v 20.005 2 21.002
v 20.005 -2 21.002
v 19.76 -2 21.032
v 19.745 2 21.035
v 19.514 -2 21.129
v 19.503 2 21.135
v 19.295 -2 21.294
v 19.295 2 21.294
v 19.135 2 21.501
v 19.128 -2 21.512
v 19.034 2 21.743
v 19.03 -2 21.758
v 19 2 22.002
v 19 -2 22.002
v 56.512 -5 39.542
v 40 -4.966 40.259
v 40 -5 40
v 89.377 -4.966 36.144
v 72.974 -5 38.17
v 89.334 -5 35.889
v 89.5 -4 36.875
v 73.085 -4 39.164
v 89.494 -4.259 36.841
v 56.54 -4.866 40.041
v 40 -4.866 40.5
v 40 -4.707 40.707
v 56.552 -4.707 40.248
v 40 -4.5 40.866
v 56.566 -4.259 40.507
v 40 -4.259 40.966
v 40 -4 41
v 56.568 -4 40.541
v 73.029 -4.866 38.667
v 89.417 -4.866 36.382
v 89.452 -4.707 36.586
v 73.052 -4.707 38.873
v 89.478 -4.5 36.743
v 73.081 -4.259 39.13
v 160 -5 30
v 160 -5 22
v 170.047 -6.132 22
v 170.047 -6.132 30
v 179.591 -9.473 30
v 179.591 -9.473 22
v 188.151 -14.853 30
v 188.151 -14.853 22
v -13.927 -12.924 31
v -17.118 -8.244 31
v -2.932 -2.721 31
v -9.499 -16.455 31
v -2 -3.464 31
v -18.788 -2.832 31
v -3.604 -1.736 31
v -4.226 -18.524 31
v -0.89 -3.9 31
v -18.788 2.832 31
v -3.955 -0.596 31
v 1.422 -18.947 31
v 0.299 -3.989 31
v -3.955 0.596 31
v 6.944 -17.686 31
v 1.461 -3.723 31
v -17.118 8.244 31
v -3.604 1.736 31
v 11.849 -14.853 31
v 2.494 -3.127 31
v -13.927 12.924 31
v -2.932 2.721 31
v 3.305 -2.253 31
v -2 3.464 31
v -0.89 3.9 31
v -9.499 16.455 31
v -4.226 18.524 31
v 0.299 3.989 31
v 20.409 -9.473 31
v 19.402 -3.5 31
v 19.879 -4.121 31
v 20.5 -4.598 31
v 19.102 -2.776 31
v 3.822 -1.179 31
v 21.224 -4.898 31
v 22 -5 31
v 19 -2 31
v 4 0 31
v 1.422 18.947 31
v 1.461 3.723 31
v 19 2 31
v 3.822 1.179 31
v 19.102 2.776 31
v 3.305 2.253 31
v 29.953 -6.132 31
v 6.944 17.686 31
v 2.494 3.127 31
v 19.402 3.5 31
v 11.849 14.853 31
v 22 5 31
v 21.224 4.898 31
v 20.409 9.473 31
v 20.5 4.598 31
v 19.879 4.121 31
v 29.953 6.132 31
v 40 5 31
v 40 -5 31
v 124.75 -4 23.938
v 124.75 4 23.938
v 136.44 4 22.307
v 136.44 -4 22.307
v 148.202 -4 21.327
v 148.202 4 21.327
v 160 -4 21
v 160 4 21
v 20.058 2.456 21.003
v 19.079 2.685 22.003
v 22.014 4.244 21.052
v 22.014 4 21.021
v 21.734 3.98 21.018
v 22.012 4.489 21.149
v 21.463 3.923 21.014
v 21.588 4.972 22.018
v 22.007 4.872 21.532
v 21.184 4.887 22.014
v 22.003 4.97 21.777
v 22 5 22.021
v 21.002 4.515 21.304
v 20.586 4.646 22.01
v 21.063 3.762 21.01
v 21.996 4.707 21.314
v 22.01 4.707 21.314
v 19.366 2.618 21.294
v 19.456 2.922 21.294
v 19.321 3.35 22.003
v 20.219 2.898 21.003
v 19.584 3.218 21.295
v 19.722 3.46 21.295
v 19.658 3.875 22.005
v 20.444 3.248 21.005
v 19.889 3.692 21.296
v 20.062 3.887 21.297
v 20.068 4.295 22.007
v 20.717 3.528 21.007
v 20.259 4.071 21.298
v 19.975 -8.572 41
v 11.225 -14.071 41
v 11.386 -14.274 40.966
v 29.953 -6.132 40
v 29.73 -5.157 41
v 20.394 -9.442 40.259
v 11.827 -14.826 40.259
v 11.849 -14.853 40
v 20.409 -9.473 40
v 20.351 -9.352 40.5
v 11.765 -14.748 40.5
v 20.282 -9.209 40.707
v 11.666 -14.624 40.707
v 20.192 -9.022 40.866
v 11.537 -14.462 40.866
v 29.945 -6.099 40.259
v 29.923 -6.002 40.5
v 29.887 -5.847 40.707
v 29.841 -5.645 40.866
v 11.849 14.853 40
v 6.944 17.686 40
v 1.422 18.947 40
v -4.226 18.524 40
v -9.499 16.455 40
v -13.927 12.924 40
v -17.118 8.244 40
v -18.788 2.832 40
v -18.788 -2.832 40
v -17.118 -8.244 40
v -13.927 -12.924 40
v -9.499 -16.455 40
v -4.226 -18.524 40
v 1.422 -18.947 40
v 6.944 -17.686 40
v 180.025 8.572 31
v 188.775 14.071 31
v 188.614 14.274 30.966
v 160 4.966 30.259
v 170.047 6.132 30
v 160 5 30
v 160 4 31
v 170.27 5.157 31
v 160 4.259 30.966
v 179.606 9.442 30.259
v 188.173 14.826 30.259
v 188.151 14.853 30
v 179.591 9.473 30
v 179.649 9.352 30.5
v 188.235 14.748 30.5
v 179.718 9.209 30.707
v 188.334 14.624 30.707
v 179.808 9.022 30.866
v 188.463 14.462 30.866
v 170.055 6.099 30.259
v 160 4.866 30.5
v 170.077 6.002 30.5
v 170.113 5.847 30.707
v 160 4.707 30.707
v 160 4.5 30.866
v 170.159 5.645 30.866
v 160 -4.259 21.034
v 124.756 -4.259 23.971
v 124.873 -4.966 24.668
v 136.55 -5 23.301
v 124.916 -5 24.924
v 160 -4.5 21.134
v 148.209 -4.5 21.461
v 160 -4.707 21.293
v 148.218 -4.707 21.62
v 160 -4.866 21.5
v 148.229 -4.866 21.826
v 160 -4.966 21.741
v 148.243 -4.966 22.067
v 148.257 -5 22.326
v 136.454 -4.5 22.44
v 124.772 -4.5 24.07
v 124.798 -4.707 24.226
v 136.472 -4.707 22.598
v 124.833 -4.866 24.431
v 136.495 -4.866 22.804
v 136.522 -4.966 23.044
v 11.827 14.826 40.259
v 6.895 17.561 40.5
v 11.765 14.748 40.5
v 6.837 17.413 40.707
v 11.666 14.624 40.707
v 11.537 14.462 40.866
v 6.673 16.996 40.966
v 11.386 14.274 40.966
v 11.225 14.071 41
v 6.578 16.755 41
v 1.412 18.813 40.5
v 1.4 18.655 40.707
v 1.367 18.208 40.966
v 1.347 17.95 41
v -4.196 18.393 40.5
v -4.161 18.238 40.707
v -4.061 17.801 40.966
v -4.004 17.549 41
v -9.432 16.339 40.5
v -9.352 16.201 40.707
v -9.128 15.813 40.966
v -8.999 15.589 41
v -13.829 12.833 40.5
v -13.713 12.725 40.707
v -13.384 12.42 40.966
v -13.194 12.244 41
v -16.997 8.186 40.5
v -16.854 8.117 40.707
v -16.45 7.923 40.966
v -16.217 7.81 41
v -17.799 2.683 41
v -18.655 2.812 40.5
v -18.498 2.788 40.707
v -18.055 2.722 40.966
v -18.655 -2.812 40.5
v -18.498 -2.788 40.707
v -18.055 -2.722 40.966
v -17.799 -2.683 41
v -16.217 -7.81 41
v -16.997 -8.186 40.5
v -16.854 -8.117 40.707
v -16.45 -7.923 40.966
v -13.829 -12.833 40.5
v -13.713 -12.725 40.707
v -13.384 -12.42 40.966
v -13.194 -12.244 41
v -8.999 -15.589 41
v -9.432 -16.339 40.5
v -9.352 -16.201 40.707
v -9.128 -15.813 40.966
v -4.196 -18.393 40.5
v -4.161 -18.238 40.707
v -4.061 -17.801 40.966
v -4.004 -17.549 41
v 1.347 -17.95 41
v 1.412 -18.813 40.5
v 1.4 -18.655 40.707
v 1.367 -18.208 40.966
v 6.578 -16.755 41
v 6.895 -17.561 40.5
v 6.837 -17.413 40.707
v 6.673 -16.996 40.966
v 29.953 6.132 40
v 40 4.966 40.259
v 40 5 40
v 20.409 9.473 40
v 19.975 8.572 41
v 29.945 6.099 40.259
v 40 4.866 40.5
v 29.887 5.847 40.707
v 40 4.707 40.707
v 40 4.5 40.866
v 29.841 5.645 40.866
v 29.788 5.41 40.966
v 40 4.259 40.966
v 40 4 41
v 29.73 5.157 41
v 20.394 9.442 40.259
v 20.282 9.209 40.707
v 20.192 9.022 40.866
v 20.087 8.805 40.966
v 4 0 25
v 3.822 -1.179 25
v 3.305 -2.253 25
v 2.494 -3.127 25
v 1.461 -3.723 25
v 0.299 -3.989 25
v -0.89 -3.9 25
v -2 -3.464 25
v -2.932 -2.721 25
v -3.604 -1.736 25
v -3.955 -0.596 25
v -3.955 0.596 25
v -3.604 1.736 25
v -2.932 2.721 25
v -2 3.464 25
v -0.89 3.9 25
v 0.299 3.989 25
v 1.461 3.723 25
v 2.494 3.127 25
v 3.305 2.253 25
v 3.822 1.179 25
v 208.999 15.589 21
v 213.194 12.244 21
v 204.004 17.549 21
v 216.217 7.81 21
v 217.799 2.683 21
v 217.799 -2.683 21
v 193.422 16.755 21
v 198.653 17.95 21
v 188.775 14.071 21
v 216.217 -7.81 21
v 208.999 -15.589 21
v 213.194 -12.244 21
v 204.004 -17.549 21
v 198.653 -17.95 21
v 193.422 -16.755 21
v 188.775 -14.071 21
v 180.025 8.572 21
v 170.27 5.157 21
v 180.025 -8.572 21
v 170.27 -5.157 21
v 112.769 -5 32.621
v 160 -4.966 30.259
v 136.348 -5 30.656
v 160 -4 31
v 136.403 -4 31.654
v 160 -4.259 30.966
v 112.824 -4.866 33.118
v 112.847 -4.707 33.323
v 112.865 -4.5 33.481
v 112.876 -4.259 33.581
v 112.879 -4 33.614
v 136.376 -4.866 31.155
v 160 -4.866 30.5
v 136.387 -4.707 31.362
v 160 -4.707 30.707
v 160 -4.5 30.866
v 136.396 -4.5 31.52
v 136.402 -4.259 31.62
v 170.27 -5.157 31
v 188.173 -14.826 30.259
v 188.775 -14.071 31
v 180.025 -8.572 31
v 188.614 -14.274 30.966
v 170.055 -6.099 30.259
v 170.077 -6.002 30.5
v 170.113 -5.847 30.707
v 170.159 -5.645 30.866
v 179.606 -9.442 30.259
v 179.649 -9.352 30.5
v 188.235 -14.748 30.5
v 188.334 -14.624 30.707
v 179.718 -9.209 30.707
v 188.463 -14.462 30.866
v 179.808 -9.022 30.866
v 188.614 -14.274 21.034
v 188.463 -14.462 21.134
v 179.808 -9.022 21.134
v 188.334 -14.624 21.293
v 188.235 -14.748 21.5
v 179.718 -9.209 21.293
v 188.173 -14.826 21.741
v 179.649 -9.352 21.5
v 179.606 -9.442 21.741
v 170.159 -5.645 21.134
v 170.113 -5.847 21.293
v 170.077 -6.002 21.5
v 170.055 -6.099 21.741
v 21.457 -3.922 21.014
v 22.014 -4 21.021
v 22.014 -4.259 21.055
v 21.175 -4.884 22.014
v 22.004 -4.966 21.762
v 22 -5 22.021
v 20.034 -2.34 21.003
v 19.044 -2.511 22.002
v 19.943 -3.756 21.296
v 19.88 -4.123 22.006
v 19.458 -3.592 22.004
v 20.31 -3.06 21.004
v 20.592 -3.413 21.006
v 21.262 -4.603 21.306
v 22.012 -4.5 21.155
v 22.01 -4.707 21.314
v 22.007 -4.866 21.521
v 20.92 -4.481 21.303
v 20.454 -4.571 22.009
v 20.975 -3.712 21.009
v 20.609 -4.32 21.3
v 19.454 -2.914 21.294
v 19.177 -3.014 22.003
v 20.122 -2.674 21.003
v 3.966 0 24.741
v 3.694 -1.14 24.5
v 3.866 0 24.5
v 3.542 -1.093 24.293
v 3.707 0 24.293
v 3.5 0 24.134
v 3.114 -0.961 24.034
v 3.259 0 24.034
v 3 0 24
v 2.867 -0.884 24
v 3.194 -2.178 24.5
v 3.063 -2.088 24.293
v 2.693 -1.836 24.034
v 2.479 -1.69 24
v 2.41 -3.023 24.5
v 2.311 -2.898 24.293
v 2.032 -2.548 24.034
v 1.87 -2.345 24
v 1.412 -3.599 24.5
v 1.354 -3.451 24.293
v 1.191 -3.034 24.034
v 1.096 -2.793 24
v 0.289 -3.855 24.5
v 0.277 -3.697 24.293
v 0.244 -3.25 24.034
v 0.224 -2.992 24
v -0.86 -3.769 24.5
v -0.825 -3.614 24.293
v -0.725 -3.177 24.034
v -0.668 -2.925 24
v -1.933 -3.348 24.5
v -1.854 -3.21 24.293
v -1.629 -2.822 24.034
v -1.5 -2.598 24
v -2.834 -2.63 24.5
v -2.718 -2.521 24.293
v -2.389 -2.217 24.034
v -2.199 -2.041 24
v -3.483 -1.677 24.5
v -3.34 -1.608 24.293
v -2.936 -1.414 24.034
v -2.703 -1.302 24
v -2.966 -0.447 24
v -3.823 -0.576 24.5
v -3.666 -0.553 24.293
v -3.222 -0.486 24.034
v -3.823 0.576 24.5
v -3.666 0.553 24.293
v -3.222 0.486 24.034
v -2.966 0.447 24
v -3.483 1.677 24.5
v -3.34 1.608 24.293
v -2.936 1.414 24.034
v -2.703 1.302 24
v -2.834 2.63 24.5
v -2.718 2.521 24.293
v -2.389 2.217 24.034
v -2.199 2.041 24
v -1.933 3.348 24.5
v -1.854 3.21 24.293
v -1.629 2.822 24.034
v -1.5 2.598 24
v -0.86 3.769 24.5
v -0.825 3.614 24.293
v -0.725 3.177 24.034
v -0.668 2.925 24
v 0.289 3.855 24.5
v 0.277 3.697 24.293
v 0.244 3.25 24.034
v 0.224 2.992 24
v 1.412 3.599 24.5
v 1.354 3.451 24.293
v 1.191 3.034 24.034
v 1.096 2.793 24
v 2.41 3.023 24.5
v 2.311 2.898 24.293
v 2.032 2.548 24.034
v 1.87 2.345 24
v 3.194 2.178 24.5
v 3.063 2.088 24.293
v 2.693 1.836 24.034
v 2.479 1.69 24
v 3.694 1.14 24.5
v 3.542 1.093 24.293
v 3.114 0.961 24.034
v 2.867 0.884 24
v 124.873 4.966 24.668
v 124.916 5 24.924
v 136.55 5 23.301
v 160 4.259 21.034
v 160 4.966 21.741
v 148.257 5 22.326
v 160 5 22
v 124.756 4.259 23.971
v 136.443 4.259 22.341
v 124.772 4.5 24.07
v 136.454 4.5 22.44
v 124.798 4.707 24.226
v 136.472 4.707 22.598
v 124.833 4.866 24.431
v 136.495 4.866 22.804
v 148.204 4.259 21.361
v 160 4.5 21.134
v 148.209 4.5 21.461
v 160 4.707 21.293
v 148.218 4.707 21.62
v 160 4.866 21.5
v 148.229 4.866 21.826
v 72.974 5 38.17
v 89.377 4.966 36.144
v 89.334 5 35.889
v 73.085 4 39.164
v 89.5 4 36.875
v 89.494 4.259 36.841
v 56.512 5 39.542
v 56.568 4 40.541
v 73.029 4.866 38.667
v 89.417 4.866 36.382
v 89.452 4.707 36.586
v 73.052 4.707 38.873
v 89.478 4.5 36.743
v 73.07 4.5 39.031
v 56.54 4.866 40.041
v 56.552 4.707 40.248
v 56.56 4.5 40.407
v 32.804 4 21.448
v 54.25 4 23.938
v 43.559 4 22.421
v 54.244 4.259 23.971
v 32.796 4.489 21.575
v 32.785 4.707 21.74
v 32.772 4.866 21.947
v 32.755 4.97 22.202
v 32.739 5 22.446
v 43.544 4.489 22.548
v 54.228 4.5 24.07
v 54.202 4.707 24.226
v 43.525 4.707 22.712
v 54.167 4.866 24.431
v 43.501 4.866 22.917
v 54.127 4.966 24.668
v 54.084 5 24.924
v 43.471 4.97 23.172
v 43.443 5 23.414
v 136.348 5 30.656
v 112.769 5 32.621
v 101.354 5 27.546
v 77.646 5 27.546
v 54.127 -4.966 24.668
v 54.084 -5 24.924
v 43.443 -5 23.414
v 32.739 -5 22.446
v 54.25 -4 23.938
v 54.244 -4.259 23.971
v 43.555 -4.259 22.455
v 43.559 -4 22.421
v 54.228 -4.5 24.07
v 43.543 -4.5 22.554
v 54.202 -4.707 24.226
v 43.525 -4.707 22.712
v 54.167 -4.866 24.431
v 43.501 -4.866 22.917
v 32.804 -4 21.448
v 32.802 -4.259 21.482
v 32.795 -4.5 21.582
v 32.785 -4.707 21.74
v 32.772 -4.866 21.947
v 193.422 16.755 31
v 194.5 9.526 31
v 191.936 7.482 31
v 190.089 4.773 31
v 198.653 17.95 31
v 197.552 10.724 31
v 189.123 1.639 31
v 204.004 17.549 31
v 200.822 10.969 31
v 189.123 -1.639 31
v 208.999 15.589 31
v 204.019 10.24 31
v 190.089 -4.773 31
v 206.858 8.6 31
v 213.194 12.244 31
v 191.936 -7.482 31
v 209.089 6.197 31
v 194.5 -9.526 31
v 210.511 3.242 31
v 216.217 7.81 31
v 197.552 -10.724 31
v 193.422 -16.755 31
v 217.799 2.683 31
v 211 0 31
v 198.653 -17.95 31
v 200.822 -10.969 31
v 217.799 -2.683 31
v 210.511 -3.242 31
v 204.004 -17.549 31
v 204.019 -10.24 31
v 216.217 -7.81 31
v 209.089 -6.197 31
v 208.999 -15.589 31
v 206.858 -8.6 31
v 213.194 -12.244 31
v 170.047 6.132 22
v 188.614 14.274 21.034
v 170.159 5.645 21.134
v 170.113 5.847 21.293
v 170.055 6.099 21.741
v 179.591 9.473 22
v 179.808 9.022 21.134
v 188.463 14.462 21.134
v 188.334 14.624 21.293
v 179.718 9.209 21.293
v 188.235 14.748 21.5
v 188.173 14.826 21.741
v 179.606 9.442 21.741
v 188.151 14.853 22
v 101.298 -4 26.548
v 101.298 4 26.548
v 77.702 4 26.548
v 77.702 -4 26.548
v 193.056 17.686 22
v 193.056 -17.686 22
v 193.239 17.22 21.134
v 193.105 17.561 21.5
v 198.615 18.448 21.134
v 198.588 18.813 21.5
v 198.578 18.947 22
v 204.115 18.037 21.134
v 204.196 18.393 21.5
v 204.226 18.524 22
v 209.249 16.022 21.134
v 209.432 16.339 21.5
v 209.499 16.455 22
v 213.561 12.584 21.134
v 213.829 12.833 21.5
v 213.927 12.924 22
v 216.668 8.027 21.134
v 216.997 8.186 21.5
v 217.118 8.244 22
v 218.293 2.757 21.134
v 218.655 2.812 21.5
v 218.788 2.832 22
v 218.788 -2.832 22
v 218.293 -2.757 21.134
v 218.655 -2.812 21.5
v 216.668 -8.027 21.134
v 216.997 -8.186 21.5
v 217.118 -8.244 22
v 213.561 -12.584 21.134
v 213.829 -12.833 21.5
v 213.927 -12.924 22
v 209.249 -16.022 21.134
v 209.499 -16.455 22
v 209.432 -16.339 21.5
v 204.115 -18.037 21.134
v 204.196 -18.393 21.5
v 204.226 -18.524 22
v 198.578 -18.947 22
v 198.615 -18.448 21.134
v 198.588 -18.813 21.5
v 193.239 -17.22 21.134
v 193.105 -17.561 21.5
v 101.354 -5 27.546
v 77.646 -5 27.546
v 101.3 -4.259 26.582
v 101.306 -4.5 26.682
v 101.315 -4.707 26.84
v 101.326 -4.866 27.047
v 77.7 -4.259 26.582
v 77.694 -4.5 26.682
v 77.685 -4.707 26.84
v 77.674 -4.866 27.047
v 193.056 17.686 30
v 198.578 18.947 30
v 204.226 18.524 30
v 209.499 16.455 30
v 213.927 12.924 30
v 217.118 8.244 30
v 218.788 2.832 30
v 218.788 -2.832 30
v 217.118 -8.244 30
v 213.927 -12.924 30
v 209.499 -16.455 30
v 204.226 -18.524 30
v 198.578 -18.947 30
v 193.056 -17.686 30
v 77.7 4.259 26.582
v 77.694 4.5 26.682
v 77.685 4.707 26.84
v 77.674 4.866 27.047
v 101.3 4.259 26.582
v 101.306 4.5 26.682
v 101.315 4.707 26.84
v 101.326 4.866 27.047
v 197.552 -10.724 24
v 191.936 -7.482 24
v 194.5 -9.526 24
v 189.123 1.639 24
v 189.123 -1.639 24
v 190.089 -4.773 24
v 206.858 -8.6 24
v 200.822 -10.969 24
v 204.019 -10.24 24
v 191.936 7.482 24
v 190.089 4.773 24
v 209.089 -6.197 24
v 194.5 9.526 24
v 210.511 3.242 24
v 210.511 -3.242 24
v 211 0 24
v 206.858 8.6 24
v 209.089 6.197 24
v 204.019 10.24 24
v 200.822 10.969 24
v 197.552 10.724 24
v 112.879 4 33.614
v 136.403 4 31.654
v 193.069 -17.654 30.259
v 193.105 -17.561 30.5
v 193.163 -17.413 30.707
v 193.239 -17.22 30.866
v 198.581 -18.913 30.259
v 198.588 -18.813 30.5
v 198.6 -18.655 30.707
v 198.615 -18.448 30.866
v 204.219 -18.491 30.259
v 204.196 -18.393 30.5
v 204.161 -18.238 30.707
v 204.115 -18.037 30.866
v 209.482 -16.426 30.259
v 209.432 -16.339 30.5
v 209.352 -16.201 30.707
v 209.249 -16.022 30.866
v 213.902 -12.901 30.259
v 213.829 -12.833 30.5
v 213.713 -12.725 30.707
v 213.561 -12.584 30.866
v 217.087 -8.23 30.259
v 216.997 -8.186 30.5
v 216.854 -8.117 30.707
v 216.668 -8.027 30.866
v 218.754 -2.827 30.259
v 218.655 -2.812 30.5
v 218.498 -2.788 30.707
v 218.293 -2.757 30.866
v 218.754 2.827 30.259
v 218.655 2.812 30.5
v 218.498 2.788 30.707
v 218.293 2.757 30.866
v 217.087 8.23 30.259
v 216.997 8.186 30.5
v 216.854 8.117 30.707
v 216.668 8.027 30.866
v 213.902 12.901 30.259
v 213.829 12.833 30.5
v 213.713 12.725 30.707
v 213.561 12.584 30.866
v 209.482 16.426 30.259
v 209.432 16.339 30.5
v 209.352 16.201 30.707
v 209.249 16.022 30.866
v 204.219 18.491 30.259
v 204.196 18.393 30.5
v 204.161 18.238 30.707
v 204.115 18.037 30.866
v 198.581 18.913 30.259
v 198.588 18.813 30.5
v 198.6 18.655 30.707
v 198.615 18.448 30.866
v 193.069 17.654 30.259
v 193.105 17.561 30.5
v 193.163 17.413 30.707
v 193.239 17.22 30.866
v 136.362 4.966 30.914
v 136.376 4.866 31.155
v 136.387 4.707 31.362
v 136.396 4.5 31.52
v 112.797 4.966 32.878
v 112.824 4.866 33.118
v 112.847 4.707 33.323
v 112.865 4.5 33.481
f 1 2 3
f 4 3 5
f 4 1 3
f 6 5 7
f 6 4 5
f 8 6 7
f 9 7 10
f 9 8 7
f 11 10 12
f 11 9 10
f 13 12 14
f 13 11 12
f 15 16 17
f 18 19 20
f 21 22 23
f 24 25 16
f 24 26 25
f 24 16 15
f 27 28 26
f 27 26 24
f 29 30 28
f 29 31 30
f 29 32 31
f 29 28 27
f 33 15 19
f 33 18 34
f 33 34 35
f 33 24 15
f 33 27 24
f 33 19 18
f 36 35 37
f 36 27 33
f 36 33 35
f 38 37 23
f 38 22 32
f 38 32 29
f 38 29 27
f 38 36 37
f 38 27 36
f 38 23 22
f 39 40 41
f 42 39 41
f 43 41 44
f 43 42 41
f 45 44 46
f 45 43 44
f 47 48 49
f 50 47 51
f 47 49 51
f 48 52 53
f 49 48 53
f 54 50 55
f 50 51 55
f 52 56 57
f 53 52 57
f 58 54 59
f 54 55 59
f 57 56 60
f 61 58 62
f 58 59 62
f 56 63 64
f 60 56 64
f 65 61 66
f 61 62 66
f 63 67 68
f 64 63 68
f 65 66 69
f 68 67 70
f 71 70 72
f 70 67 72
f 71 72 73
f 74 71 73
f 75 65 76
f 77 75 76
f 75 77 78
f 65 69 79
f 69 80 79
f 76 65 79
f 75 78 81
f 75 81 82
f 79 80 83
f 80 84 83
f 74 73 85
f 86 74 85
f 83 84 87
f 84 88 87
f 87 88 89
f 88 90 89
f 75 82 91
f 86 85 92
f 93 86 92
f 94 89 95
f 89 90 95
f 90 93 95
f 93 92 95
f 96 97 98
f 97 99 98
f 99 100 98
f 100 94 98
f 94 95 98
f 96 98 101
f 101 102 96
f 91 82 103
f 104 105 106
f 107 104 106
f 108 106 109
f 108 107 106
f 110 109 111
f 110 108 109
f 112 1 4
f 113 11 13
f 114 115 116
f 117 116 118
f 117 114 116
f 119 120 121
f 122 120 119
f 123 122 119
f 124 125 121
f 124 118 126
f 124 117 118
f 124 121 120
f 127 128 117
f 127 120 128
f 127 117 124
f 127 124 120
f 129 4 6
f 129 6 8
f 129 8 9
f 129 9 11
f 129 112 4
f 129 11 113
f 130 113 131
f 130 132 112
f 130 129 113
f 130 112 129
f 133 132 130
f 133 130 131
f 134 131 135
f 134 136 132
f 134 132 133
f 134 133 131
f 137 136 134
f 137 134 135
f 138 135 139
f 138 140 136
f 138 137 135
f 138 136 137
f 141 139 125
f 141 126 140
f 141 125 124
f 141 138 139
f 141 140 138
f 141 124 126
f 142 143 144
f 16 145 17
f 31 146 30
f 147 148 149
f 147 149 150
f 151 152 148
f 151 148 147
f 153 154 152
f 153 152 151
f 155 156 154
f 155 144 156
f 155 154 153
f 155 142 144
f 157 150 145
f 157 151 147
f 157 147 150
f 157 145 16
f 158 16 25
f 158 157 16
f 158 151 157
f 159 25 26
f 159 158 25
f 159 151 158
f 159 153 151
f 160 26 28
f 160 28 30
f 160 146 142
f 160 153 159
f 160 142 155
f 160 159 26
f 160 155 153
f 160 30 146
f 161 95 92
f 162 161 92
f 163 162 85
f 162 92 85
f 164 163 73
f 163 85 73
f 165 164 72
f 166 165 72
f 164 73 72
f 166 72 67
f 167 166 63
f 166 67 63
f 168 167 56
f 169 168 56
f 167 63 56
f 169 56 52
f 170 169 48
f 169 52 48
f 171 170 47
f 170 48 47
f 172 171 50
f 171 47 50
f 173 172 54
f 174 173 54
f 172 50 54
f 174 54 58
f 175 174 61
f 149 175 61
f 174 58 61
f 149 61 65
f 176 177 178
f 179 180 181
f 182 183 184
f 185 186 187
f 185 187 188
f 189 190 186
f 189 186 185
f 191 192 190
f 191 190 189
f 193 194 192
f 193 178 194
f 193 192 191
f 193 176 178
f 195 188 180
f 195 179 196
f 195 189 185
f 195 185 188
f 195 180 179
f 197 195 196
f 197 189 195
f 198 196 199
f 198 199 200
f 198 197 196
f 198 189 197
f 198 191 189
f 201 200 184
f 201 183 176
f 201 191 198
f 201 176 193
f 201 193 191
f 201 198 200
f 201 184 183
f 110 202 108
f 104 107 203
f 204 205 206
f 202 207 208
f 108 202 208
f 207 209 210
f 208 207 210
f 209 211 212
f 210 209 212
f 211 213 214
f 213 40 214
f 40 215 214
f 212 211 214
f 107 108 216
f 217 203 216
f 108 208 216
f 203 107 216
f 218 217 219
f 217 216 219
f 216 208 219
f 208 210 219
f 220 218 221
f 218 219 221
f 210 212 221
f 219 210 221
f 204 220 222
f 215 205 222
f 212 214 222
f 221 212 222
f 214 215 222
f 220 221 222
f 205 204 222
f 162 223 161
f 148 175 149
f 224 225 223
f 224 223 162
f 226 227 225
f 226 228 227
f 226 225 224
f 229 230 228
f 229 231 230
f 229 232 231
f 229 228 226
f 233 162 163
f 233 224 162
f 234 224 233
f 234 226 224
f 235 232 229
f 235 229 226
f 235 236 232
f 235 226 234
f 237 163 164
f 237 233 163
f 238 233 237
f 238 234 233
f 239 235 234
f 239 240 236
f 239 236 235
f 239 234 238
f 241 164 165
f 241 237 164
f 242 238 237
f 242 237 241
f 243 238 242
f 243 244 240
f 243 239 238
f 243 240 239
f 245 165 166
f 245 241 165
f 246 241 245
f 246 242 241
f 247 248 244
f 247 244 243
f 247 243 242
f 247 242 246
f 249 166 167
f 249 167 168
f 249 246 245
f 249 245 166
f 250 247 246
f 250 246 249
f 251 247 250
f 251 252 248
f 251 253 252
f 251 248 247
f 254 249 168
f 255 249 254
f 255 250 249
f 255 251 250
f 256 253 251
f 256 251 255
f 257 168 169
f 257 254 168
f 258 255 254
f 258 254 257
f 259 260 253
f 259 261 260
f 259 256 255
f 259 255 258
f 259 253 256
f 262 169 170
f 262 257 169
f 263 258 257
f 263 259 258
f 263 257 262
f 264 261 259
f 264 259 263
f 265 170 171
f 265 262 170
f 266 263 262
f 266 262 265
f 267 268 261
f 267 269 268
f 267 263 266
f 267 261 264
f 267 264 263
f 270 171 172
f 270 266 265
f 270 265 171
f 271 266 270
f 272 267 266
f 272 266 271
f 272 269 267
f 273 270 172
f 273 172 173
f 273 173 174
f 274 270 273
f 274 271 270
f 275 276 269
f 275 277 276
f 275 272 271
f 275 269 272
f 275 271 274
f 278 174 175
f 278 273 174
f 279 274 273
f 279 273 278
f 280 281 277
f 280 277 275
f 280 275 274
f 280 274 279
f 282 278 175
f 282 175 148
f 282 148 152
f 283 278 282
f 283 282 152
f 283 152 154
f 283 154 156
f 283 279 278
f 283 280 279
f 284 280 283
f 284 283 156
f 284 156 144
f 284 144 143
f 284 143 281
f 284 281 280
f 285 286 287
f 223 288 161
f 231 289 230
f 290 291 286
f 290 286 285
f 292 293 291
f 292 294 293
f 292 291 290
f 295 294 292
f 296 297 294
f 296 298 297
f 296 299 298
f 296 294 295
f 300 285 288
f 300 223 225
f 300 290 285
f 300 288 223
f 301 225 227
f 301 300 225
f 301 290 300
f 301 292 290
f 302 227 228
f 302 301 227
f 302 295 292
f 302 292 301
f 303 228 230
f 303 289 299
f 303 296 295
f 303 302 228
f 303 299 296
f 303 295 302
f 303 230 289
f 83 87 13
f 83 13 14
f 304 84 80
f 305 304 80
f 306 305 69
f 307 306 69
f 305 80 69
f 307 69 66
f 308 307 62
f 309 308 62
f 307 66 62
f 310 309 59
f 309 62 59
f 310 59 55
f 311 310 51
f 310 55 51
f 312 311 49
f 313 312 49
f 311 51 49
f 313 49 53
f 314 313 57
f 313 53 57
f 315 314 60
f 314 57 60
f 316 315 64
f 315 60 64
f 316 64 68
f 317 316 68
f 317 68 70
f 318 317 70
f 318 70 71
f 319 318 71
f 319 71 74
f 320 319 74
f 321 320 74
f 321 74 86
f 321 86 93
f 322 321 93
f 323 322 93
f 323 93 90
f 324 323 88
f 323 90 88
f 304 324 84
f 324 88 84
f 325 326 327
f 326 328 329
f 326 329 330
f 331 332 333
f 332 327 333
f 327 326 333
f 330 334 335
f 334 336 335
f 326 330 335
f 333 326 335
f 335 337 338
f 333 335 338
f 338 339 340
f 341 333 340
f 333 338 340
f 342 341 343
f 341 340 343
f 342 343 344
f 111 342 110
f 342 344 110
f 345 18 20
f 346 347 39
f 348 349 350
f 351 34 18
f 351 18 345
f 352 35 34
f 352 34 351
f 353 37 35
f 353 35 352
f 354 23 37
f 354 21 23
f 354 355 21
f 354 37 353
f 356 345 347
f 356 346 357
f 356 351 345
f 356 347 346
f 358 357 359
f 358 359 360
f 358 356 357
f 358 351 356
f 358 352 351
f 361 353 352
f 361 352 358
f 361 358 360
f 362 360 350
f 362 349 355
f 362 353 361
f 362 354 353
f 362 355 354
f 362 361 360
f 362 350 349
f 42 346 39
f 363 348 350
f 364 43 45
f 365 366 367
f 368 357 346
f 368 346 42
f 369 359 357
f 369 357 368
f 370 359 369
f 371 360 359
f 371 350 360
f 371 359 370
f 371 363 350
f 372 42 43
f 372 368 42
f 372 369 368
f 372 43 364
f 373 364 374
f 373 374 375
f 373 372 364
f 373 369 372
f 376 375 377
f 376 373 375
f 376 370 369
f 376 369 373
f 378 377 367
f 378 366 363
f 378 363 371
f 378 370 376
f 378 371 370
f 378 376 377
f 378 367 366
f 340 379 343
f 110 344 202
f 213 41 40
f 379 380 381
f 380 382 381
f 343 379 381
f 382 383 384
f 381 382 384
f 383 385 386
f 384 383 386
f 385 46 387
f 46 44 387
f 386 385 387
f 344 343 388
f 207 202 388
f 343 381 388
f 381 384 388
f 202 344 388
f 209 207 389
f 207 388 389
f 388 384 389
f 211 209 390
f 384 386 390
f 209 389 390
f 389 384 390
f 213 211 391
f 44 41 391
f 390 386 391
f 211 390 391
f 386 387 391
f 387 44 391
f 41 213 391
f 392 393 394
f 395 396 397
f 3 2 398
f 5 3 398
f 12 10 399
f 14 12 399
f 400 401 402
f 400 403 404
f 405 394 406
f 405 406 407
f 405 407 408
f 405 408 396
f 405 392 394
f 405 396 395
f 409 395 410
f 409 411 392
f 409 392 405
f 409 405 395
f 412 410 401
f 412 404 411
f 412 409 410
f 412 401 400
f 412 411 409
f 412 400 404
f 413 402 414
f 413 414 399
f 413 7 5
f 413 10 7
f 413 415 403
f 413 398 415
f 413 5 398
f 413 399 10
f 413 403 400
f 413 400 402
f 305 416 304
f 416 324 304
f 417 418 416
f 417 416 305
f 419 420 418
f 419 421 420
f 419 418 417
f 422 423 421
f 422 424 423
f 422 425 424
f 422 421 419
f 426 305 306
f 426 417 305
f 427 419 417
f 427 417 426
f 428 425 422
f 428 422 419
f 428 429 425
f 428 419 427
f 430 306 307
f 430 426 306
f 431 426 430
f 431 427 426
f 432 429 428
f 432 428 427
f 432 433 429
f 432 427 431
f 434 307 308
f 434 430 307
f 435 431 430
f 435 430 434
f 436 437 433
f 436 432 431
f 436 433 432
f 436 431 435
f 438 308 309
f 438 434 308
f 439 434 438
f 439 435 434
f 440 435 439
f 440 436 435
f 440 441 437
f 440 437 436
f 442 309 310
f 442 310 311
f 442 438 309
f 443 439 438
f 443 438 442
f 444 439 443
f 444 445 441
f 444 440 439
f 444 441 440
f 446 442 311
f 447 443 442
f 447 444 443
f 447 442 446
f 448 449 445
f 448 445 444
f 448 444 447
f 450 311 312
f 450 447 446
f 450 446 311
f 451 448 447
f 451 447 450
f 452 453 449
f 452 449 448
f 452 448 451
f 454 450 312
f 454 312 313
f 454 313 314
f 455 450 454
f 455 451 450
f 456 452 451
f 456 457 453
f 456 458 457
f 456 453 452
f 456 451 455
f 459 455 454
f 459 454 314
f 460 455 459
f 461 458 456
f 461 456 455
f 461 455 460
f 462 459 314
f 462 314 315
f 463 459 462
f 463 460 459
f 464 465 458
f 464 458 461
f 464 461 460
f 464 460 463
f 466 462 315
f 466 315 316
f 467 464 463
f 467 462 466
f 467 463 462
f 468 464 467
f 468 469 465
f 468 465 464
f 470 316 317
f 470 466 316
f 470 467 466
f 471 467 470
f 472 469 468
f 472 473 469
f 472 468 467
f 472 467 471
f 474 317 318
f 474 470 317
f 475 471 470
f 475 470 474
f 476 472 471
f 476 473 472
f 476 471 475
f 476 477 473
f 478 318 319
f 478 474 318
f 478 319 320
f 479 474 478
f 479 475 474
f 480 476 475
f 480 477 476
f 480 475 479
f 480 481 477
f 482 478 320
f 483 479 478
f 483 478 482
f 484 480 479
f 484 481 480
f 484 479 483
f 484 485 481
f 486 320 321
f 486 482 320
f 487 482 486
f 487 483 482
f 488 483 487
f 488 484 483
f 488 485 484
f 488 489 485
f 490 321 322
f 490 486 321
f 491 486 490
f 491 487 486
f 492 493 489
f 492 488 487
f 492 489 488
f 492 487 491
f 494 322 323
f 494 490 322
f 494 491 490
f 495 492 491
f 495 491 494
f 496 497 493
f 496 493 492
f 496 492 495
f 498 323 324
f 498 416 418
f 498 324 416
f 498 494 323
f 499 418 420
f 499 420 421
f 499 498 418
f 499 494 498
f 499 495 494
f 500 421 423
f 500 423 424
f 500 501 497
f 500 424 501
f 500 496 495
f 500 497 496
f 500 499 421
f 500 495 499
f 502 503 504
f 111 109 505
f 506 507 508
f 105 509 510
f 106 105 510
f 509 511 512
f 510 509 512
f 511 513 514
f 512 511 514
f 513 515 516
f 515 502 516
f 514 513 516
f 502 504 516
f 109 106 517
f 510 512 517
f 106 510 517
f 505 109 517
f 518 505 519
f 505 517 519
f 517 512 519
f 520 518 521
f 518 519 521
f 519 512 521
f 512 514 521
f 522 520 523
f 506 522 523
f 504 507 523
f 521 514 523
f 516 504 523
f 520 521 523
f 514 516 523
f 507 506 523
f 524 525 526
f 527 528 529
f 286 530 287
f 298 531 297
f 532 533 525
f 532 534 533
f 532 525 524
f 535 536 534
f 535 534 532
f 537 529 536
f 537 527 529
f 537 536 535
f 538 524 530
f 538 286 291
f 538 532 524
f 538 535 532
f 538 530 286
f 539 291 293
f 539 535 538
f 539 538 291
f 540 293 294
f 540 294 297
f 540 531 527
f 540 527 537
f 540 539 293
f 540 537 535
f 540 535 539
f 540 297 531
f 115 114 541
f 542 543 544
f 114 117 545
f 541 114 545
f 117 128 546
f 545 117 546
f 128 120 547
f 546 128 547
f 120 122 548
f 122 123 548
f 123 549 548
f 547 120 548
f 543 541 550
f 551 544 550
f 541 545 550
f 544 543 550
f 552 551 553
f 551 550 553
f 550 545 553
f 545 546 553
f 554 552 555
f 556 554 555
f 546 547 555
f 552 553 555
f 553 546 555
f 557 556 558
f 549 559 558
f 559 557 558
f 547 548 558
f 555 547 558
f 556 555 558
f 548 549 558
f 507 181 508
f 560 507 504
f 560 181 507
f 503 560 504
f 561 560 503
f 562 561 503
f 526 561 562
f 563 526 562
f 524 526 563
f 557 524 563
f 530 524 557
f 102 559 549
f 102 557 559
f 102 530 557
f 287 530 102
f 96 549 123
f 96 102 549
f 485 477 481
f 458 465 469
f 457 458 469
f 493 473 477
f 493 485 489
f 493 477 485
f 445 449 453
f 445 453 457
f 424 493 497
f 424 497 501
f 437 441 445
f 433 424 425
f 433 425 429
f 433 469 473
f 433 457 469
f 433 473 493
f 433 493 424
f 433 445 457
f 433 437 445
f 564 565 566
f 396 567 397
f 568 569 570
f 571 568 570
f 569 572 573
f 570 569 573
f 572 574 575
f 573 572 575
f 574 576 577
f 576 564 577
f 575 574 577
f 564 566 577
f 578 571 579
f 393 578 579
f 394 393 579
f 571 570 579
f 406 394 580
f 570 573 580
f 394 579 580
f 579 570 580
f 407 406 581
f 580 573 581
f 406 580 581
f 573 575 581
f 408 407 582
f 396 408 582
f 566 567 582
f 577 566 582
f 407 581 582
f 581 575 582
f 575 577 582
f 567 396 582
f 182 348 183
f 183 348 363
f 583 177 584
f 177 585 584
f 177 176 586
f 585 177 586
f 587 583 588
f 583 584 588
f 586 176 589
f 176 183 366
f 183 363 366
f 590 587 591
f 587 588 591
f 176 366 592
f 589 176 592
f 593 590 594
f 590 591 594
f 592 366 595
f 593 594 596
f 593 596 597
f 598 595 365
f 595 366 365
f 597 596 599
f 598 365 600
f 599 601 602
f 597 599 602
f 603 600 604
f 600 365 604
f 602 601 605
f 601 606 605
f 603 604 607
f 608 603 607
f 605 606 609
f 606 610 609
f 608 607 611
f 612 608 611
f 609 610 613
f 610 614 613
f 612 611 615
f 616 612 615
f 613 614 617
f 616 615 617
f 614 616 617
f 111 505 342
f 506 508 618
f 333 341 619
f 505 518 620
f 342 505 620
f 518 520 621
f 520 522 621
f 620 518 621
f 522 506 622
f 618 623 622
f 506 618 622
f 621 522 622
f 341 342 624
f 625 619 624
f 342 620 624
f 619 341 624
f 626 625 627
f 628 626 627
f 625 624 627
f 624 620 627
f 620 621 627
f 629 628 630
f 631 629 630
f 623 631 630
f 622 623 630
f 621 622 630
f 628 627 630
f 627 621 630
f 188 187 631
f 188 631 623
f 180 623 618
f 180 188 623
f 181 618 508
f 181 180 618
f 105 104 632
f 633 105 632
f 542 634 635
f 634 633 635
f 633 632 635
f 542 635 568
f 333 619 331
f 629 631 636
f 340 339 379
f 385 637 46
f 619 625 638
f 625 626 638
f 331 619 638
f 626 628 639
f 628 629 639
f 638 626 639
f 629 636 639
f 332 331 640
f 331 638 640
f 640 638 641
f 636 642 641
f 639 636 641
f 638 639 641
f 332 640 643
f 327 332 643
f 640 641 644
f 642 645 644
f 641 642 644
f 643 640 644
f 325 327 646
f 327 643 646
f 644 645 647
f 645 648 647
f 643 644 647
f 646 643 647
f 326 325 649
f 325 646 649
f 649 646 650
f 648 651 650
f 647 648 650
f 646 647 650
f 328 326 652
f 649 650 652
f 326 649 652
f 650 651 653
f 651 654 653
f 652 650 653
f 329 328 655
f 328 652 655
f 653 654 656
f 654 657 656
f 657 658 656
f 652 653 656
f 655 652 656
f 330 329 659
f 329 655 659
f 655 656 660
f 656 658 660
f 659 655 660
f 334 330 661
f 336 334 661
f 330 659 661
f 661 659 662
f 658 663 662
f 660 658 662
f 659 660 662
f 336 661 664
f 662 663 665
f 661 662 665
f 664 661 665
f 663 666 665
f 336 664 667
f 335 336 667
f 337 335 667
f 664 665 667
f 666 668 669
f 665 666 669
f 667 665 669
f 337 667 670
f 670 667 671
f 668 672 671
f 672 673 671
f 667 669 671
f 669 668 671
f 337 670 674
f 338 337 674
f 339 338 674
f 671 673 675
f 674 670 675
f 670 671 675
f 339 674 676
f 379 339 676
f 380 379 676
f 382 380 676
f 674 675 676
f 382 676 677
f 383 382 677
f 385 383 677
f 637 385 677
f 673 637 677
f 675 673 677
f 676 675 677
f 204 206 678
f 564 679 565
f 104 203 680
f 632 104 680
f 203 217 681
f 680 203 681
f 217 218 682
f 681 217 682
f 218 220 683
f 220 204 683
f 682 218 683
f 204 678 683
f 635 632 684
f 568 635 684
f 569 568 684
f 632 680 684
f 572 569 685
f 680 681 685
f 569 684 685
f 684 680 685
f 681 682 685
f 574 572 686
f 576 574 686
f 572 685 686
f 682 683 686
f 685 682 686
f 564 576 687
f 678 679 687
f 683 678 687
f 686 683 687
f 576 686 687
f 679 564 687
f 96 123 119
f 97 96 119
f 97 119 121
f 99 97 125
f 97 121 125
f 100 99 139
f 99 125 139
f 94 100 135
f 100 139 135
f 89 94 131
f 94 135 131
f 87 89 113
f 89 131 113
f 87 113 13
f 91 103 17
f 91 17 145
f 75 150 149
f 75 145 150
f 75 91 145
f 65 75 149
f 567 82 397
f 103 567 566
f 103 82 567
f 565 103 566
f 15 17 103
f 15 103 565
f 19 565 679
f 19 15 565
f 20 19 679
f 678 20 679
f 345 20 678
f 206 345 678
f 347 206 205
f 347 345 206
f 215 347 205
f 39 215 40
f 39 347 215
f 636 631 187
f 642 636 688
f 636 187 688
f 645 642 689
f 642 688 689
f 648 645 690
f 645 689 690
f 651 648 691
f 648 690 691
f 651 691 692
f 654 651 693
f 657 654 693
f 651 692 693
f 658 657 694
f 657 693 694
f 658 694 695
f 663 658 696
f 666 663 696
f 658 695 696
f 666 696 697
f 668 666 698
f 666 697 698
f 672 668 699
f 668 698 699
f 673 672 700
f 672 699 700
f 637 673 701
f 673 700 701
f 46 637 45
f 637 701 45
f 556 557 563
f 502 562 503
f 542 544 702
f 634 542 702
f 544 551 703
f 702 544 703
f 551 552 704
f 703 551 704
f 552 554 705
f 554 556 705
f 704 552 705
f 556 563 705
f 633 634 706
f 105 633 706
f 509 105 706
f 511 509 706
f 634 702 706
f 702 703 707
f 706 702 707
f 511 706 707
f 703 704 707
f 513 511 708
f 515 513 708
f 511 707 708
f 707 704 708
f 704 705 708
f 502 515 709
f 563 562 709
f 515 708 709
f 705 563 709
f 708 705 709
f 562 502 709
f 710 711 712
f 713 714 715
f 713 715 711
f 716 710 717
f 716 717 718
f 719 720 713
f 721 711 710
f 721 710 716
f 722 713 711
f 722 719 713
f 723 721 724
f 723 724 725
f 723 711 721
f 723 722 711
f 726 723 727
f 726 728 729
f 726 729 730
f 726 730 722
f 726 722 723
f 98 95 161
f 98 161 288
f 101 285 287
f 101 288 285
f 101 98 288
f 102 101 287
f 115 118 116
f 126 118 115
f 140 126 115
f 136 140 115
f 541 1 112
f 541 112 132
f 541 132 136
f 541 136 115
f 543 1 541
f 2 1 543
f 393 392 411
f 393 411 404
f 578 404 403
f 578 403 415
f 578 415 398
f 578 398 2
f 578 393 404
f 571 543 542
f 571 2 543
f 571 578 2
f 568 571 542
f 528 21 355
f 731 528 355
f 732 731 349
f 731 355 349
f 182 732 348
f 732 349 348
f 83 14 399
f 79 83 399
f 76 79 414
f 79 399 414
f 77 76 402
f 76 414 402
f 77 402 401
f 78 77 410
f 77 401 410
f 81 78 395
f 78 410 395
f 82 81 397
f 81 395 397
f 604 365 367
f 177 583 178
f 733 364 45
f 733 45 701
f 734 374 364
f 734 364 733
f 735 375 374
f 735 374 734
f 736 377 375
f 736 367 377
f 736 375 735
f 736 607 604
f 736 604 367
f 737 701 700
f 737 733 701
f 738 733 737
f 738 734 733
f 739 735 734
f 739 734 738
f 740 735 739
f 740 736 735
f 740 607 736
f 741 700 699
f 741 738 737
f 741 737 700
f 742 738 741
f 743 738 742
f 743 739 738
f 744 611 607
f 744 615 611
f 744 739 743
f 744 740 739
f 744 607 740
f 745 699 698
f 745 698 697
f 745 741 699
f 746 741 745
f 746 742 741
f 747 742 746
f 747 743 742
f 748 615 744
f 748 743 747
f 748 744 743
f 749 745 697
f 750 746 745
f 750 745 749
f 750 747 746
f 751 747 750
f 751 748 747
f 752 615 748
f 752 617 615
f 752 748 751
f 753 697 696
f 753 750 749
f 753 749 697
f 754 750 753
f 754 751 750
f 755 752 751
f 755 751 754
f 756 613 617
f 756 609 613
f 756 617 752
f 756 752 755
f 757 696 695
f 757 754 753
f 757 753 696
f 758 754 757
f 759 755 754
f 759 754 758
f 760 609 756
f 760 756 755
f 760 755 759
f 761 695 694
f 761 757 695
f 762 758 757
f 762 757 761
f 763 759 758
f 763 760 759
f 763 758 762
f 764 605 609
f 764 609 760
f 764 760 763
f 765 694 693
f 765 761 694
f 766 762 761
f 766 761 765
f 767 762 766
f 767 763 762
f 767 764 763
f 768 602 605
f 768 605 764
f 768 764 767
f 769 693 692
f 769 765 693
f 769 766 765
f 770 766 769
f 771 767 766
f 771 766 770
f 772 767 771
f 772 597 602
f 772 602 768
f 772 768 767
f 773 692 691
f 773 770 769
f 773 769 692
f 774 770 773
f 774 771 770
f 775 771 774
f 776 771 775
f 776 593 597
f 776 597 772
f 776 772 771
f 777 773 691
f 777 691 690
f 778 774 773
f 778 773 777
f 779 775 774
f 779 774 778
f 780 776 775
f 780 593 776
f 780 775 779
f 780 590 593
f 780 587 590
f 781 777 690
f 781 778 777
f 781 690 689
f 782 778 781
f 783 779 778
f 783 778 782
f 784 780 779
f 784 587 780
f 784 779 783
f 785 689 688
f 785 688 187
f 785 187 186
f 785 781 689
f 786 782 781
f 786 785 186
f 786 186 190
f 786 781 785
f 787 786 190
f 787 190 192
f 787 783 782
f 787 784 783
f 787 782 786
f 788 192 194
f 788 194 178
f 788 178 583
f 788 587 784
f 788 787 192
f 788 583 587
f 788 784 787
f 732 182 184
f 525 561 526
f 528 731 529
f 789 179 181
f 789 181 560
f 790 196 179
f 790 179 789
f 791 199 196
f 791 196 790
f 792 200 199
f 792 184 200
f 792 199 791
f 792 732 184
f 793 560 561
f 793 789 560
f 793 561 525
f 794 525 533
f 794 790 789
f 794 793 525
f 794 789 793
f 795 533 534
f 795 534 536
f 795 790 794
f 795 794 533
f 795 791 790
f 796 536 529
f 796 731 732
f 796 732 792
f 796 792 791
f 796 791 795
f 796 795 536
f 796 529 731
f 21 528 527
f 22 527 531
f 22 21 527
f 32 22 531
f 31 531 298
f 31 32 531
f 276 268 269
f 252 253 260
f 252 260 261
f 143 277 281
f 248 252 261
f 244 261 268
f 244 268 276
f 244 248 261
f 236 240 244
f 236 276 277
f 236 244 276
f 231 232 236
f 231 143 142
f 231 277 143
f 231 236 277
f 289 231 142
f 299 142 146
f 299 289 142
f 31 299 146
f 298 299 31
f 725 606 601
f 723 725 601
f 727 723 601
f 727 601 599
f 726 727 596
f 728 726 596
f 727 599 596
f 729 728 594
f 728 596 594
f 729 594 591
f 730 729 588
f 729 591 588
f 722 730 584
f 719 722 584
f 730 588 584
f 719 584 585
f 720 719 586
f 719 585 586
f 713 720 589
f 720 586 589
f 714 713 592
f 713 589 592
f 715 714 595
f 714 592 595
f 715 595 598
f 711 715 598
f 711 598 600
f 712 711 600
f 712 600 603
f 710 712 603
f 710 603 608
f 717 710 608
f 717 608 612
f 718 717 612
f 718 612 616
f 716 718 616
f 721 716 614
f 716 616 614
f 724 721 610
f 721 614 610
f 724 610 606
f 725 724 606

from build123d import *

# Parameters (mm, degrees)
PAD001_DEPTH    = 10
PAD002_DEPTH    = 10
SKETCH006_R     = 11
POCKET004_DEPTH = 7
SKETCH007_R     = 4
PAD003_DEPTH    = 7
POCKET005_DEPTH = 24.001
FILLET002_R     = 1
FILLET003_R     = 3
FILLET004_R     = 1


with BuildPart() as part:
    # Sketch004 (on Binder) → Pad001 (new body)
    with BuildSketch(Plane.XY.offset(31)):
        with BuildLine():
            ThreePointArc((11.848552, 14.853007), (-19, 0), (11.848552, -14.853007))
            ThreePointArc((40, -5), (25.087038, -7.534394), (11.848552, -14.853007))
            Line((40, -5), (181, -5))
            Line((181, 5), (181, -5))
            Line((40, 5), (181, 5))
            ThreePointArc((11.848552, 14.853007), (25.087038, 7.534394), (40, 5))
        make_face()
    extrude(amount=PAD001_DEPTH)

    # Sketch005 (on Face7 of Pad001) → Pad002 (join)
    with BuildSketch(Plane(origin=(0, 0, 31), x_dir=(1, 0, 0), z_dir=(0, 0, -1))):
        with BuildLine():
            Line((19, 5), (160, 5))
            ThreePointArc((160, 5), (174.912962, 7.534394), (188.151448, 14.853007))
            ThreePointArc((188.151448, -14.853007), (219, 0), (188.151448, 14.853007))
            ThreePointArc((188.151448, -14.853007), (174.912962, -7.534394), (160, -5))
            Line((160, -5), (19, -5))
            Line((19, -5), (19, 5))
        make_face()
    extrude(amount=PAD002_DEPTH)

    # Sketch006 (on Face7 of Pad002) → Pocket004 (cut)
    with BuildSketch(Plane.XY.offset(31)):
        with Locations((200, 0)):
            Circle(SKETCH006_R)
    extrude(amount=-POCKET004_DEPTH, mode=Mode.SUBTRACT)

    # Sketch007 (on Face4 of Pocket004) → Pad003 (join)
    with BuildSketch(Plane(origin=(0, 0, 31), x_dir=(1, 0, 0), z_dir=(0, 0, -1))):
        Circle(SKETCH007_R)
    extrude(amount=PAD003_DEPTH)

    # Sketch008 (on Face12 of Pad003) → Pocket005 (cut, through all)
    with BuildSketch(Plane.XZ.offset(5)):
        with BuildLine():
            ThreePointArc((89.5, 36.875), (64.835789, 39.966966), (40, 41))
            Line((188.151448, 41), (40, 41))
            Line((188.151448, 31), (188.151448, 41))
            Line((160, 31), (188.151448, 31))
            ThreePointArc((89.5, 36.875), (124.627816, 32.471291), (160, 31))
        make_face()
        with BuildLine():
            ThreePointArc((19, 21), (36.686092, 21.735646), (54.25, 23.9375))
            ThreePointArc((124.75, 23.9375), (89.5, 26.875), (54.25, 23.9375))
            ThreePointArc((124.75, 23.9375), (142.313908, 21.735646), (160, 21))
            Line((19, 21), (160, 21))
        make_face()
    extrude(amount=-POCKET005_DEPTH, mode=Mode.SUBTRACT)

    # Fillet002
    fillet002_edges = [part.edges().sort_by_distance(p)[0] for p in [
        (-4, 0, 24),
    ]]
    fillet(fillet002_edges, radius=FILLET002_R)

    # Fillet003
    fillet003_edges = [part.edges().sort_by_distance(p)[0] for p in [
        (19, 5, 26),
        (19, -5, 26),
    ]]
    fillet(fillet003_edges, radius=FILLET003_R)

    # Fillet004
    fillet004_edges = [part.edges().sort_by_distance(p)[0] for p in [
        (219, 0, 21),
        (-19, 0, 41),
    ]]
    fillet(fillet004_edges, radius=FILLET004_R)


solid = part.part
